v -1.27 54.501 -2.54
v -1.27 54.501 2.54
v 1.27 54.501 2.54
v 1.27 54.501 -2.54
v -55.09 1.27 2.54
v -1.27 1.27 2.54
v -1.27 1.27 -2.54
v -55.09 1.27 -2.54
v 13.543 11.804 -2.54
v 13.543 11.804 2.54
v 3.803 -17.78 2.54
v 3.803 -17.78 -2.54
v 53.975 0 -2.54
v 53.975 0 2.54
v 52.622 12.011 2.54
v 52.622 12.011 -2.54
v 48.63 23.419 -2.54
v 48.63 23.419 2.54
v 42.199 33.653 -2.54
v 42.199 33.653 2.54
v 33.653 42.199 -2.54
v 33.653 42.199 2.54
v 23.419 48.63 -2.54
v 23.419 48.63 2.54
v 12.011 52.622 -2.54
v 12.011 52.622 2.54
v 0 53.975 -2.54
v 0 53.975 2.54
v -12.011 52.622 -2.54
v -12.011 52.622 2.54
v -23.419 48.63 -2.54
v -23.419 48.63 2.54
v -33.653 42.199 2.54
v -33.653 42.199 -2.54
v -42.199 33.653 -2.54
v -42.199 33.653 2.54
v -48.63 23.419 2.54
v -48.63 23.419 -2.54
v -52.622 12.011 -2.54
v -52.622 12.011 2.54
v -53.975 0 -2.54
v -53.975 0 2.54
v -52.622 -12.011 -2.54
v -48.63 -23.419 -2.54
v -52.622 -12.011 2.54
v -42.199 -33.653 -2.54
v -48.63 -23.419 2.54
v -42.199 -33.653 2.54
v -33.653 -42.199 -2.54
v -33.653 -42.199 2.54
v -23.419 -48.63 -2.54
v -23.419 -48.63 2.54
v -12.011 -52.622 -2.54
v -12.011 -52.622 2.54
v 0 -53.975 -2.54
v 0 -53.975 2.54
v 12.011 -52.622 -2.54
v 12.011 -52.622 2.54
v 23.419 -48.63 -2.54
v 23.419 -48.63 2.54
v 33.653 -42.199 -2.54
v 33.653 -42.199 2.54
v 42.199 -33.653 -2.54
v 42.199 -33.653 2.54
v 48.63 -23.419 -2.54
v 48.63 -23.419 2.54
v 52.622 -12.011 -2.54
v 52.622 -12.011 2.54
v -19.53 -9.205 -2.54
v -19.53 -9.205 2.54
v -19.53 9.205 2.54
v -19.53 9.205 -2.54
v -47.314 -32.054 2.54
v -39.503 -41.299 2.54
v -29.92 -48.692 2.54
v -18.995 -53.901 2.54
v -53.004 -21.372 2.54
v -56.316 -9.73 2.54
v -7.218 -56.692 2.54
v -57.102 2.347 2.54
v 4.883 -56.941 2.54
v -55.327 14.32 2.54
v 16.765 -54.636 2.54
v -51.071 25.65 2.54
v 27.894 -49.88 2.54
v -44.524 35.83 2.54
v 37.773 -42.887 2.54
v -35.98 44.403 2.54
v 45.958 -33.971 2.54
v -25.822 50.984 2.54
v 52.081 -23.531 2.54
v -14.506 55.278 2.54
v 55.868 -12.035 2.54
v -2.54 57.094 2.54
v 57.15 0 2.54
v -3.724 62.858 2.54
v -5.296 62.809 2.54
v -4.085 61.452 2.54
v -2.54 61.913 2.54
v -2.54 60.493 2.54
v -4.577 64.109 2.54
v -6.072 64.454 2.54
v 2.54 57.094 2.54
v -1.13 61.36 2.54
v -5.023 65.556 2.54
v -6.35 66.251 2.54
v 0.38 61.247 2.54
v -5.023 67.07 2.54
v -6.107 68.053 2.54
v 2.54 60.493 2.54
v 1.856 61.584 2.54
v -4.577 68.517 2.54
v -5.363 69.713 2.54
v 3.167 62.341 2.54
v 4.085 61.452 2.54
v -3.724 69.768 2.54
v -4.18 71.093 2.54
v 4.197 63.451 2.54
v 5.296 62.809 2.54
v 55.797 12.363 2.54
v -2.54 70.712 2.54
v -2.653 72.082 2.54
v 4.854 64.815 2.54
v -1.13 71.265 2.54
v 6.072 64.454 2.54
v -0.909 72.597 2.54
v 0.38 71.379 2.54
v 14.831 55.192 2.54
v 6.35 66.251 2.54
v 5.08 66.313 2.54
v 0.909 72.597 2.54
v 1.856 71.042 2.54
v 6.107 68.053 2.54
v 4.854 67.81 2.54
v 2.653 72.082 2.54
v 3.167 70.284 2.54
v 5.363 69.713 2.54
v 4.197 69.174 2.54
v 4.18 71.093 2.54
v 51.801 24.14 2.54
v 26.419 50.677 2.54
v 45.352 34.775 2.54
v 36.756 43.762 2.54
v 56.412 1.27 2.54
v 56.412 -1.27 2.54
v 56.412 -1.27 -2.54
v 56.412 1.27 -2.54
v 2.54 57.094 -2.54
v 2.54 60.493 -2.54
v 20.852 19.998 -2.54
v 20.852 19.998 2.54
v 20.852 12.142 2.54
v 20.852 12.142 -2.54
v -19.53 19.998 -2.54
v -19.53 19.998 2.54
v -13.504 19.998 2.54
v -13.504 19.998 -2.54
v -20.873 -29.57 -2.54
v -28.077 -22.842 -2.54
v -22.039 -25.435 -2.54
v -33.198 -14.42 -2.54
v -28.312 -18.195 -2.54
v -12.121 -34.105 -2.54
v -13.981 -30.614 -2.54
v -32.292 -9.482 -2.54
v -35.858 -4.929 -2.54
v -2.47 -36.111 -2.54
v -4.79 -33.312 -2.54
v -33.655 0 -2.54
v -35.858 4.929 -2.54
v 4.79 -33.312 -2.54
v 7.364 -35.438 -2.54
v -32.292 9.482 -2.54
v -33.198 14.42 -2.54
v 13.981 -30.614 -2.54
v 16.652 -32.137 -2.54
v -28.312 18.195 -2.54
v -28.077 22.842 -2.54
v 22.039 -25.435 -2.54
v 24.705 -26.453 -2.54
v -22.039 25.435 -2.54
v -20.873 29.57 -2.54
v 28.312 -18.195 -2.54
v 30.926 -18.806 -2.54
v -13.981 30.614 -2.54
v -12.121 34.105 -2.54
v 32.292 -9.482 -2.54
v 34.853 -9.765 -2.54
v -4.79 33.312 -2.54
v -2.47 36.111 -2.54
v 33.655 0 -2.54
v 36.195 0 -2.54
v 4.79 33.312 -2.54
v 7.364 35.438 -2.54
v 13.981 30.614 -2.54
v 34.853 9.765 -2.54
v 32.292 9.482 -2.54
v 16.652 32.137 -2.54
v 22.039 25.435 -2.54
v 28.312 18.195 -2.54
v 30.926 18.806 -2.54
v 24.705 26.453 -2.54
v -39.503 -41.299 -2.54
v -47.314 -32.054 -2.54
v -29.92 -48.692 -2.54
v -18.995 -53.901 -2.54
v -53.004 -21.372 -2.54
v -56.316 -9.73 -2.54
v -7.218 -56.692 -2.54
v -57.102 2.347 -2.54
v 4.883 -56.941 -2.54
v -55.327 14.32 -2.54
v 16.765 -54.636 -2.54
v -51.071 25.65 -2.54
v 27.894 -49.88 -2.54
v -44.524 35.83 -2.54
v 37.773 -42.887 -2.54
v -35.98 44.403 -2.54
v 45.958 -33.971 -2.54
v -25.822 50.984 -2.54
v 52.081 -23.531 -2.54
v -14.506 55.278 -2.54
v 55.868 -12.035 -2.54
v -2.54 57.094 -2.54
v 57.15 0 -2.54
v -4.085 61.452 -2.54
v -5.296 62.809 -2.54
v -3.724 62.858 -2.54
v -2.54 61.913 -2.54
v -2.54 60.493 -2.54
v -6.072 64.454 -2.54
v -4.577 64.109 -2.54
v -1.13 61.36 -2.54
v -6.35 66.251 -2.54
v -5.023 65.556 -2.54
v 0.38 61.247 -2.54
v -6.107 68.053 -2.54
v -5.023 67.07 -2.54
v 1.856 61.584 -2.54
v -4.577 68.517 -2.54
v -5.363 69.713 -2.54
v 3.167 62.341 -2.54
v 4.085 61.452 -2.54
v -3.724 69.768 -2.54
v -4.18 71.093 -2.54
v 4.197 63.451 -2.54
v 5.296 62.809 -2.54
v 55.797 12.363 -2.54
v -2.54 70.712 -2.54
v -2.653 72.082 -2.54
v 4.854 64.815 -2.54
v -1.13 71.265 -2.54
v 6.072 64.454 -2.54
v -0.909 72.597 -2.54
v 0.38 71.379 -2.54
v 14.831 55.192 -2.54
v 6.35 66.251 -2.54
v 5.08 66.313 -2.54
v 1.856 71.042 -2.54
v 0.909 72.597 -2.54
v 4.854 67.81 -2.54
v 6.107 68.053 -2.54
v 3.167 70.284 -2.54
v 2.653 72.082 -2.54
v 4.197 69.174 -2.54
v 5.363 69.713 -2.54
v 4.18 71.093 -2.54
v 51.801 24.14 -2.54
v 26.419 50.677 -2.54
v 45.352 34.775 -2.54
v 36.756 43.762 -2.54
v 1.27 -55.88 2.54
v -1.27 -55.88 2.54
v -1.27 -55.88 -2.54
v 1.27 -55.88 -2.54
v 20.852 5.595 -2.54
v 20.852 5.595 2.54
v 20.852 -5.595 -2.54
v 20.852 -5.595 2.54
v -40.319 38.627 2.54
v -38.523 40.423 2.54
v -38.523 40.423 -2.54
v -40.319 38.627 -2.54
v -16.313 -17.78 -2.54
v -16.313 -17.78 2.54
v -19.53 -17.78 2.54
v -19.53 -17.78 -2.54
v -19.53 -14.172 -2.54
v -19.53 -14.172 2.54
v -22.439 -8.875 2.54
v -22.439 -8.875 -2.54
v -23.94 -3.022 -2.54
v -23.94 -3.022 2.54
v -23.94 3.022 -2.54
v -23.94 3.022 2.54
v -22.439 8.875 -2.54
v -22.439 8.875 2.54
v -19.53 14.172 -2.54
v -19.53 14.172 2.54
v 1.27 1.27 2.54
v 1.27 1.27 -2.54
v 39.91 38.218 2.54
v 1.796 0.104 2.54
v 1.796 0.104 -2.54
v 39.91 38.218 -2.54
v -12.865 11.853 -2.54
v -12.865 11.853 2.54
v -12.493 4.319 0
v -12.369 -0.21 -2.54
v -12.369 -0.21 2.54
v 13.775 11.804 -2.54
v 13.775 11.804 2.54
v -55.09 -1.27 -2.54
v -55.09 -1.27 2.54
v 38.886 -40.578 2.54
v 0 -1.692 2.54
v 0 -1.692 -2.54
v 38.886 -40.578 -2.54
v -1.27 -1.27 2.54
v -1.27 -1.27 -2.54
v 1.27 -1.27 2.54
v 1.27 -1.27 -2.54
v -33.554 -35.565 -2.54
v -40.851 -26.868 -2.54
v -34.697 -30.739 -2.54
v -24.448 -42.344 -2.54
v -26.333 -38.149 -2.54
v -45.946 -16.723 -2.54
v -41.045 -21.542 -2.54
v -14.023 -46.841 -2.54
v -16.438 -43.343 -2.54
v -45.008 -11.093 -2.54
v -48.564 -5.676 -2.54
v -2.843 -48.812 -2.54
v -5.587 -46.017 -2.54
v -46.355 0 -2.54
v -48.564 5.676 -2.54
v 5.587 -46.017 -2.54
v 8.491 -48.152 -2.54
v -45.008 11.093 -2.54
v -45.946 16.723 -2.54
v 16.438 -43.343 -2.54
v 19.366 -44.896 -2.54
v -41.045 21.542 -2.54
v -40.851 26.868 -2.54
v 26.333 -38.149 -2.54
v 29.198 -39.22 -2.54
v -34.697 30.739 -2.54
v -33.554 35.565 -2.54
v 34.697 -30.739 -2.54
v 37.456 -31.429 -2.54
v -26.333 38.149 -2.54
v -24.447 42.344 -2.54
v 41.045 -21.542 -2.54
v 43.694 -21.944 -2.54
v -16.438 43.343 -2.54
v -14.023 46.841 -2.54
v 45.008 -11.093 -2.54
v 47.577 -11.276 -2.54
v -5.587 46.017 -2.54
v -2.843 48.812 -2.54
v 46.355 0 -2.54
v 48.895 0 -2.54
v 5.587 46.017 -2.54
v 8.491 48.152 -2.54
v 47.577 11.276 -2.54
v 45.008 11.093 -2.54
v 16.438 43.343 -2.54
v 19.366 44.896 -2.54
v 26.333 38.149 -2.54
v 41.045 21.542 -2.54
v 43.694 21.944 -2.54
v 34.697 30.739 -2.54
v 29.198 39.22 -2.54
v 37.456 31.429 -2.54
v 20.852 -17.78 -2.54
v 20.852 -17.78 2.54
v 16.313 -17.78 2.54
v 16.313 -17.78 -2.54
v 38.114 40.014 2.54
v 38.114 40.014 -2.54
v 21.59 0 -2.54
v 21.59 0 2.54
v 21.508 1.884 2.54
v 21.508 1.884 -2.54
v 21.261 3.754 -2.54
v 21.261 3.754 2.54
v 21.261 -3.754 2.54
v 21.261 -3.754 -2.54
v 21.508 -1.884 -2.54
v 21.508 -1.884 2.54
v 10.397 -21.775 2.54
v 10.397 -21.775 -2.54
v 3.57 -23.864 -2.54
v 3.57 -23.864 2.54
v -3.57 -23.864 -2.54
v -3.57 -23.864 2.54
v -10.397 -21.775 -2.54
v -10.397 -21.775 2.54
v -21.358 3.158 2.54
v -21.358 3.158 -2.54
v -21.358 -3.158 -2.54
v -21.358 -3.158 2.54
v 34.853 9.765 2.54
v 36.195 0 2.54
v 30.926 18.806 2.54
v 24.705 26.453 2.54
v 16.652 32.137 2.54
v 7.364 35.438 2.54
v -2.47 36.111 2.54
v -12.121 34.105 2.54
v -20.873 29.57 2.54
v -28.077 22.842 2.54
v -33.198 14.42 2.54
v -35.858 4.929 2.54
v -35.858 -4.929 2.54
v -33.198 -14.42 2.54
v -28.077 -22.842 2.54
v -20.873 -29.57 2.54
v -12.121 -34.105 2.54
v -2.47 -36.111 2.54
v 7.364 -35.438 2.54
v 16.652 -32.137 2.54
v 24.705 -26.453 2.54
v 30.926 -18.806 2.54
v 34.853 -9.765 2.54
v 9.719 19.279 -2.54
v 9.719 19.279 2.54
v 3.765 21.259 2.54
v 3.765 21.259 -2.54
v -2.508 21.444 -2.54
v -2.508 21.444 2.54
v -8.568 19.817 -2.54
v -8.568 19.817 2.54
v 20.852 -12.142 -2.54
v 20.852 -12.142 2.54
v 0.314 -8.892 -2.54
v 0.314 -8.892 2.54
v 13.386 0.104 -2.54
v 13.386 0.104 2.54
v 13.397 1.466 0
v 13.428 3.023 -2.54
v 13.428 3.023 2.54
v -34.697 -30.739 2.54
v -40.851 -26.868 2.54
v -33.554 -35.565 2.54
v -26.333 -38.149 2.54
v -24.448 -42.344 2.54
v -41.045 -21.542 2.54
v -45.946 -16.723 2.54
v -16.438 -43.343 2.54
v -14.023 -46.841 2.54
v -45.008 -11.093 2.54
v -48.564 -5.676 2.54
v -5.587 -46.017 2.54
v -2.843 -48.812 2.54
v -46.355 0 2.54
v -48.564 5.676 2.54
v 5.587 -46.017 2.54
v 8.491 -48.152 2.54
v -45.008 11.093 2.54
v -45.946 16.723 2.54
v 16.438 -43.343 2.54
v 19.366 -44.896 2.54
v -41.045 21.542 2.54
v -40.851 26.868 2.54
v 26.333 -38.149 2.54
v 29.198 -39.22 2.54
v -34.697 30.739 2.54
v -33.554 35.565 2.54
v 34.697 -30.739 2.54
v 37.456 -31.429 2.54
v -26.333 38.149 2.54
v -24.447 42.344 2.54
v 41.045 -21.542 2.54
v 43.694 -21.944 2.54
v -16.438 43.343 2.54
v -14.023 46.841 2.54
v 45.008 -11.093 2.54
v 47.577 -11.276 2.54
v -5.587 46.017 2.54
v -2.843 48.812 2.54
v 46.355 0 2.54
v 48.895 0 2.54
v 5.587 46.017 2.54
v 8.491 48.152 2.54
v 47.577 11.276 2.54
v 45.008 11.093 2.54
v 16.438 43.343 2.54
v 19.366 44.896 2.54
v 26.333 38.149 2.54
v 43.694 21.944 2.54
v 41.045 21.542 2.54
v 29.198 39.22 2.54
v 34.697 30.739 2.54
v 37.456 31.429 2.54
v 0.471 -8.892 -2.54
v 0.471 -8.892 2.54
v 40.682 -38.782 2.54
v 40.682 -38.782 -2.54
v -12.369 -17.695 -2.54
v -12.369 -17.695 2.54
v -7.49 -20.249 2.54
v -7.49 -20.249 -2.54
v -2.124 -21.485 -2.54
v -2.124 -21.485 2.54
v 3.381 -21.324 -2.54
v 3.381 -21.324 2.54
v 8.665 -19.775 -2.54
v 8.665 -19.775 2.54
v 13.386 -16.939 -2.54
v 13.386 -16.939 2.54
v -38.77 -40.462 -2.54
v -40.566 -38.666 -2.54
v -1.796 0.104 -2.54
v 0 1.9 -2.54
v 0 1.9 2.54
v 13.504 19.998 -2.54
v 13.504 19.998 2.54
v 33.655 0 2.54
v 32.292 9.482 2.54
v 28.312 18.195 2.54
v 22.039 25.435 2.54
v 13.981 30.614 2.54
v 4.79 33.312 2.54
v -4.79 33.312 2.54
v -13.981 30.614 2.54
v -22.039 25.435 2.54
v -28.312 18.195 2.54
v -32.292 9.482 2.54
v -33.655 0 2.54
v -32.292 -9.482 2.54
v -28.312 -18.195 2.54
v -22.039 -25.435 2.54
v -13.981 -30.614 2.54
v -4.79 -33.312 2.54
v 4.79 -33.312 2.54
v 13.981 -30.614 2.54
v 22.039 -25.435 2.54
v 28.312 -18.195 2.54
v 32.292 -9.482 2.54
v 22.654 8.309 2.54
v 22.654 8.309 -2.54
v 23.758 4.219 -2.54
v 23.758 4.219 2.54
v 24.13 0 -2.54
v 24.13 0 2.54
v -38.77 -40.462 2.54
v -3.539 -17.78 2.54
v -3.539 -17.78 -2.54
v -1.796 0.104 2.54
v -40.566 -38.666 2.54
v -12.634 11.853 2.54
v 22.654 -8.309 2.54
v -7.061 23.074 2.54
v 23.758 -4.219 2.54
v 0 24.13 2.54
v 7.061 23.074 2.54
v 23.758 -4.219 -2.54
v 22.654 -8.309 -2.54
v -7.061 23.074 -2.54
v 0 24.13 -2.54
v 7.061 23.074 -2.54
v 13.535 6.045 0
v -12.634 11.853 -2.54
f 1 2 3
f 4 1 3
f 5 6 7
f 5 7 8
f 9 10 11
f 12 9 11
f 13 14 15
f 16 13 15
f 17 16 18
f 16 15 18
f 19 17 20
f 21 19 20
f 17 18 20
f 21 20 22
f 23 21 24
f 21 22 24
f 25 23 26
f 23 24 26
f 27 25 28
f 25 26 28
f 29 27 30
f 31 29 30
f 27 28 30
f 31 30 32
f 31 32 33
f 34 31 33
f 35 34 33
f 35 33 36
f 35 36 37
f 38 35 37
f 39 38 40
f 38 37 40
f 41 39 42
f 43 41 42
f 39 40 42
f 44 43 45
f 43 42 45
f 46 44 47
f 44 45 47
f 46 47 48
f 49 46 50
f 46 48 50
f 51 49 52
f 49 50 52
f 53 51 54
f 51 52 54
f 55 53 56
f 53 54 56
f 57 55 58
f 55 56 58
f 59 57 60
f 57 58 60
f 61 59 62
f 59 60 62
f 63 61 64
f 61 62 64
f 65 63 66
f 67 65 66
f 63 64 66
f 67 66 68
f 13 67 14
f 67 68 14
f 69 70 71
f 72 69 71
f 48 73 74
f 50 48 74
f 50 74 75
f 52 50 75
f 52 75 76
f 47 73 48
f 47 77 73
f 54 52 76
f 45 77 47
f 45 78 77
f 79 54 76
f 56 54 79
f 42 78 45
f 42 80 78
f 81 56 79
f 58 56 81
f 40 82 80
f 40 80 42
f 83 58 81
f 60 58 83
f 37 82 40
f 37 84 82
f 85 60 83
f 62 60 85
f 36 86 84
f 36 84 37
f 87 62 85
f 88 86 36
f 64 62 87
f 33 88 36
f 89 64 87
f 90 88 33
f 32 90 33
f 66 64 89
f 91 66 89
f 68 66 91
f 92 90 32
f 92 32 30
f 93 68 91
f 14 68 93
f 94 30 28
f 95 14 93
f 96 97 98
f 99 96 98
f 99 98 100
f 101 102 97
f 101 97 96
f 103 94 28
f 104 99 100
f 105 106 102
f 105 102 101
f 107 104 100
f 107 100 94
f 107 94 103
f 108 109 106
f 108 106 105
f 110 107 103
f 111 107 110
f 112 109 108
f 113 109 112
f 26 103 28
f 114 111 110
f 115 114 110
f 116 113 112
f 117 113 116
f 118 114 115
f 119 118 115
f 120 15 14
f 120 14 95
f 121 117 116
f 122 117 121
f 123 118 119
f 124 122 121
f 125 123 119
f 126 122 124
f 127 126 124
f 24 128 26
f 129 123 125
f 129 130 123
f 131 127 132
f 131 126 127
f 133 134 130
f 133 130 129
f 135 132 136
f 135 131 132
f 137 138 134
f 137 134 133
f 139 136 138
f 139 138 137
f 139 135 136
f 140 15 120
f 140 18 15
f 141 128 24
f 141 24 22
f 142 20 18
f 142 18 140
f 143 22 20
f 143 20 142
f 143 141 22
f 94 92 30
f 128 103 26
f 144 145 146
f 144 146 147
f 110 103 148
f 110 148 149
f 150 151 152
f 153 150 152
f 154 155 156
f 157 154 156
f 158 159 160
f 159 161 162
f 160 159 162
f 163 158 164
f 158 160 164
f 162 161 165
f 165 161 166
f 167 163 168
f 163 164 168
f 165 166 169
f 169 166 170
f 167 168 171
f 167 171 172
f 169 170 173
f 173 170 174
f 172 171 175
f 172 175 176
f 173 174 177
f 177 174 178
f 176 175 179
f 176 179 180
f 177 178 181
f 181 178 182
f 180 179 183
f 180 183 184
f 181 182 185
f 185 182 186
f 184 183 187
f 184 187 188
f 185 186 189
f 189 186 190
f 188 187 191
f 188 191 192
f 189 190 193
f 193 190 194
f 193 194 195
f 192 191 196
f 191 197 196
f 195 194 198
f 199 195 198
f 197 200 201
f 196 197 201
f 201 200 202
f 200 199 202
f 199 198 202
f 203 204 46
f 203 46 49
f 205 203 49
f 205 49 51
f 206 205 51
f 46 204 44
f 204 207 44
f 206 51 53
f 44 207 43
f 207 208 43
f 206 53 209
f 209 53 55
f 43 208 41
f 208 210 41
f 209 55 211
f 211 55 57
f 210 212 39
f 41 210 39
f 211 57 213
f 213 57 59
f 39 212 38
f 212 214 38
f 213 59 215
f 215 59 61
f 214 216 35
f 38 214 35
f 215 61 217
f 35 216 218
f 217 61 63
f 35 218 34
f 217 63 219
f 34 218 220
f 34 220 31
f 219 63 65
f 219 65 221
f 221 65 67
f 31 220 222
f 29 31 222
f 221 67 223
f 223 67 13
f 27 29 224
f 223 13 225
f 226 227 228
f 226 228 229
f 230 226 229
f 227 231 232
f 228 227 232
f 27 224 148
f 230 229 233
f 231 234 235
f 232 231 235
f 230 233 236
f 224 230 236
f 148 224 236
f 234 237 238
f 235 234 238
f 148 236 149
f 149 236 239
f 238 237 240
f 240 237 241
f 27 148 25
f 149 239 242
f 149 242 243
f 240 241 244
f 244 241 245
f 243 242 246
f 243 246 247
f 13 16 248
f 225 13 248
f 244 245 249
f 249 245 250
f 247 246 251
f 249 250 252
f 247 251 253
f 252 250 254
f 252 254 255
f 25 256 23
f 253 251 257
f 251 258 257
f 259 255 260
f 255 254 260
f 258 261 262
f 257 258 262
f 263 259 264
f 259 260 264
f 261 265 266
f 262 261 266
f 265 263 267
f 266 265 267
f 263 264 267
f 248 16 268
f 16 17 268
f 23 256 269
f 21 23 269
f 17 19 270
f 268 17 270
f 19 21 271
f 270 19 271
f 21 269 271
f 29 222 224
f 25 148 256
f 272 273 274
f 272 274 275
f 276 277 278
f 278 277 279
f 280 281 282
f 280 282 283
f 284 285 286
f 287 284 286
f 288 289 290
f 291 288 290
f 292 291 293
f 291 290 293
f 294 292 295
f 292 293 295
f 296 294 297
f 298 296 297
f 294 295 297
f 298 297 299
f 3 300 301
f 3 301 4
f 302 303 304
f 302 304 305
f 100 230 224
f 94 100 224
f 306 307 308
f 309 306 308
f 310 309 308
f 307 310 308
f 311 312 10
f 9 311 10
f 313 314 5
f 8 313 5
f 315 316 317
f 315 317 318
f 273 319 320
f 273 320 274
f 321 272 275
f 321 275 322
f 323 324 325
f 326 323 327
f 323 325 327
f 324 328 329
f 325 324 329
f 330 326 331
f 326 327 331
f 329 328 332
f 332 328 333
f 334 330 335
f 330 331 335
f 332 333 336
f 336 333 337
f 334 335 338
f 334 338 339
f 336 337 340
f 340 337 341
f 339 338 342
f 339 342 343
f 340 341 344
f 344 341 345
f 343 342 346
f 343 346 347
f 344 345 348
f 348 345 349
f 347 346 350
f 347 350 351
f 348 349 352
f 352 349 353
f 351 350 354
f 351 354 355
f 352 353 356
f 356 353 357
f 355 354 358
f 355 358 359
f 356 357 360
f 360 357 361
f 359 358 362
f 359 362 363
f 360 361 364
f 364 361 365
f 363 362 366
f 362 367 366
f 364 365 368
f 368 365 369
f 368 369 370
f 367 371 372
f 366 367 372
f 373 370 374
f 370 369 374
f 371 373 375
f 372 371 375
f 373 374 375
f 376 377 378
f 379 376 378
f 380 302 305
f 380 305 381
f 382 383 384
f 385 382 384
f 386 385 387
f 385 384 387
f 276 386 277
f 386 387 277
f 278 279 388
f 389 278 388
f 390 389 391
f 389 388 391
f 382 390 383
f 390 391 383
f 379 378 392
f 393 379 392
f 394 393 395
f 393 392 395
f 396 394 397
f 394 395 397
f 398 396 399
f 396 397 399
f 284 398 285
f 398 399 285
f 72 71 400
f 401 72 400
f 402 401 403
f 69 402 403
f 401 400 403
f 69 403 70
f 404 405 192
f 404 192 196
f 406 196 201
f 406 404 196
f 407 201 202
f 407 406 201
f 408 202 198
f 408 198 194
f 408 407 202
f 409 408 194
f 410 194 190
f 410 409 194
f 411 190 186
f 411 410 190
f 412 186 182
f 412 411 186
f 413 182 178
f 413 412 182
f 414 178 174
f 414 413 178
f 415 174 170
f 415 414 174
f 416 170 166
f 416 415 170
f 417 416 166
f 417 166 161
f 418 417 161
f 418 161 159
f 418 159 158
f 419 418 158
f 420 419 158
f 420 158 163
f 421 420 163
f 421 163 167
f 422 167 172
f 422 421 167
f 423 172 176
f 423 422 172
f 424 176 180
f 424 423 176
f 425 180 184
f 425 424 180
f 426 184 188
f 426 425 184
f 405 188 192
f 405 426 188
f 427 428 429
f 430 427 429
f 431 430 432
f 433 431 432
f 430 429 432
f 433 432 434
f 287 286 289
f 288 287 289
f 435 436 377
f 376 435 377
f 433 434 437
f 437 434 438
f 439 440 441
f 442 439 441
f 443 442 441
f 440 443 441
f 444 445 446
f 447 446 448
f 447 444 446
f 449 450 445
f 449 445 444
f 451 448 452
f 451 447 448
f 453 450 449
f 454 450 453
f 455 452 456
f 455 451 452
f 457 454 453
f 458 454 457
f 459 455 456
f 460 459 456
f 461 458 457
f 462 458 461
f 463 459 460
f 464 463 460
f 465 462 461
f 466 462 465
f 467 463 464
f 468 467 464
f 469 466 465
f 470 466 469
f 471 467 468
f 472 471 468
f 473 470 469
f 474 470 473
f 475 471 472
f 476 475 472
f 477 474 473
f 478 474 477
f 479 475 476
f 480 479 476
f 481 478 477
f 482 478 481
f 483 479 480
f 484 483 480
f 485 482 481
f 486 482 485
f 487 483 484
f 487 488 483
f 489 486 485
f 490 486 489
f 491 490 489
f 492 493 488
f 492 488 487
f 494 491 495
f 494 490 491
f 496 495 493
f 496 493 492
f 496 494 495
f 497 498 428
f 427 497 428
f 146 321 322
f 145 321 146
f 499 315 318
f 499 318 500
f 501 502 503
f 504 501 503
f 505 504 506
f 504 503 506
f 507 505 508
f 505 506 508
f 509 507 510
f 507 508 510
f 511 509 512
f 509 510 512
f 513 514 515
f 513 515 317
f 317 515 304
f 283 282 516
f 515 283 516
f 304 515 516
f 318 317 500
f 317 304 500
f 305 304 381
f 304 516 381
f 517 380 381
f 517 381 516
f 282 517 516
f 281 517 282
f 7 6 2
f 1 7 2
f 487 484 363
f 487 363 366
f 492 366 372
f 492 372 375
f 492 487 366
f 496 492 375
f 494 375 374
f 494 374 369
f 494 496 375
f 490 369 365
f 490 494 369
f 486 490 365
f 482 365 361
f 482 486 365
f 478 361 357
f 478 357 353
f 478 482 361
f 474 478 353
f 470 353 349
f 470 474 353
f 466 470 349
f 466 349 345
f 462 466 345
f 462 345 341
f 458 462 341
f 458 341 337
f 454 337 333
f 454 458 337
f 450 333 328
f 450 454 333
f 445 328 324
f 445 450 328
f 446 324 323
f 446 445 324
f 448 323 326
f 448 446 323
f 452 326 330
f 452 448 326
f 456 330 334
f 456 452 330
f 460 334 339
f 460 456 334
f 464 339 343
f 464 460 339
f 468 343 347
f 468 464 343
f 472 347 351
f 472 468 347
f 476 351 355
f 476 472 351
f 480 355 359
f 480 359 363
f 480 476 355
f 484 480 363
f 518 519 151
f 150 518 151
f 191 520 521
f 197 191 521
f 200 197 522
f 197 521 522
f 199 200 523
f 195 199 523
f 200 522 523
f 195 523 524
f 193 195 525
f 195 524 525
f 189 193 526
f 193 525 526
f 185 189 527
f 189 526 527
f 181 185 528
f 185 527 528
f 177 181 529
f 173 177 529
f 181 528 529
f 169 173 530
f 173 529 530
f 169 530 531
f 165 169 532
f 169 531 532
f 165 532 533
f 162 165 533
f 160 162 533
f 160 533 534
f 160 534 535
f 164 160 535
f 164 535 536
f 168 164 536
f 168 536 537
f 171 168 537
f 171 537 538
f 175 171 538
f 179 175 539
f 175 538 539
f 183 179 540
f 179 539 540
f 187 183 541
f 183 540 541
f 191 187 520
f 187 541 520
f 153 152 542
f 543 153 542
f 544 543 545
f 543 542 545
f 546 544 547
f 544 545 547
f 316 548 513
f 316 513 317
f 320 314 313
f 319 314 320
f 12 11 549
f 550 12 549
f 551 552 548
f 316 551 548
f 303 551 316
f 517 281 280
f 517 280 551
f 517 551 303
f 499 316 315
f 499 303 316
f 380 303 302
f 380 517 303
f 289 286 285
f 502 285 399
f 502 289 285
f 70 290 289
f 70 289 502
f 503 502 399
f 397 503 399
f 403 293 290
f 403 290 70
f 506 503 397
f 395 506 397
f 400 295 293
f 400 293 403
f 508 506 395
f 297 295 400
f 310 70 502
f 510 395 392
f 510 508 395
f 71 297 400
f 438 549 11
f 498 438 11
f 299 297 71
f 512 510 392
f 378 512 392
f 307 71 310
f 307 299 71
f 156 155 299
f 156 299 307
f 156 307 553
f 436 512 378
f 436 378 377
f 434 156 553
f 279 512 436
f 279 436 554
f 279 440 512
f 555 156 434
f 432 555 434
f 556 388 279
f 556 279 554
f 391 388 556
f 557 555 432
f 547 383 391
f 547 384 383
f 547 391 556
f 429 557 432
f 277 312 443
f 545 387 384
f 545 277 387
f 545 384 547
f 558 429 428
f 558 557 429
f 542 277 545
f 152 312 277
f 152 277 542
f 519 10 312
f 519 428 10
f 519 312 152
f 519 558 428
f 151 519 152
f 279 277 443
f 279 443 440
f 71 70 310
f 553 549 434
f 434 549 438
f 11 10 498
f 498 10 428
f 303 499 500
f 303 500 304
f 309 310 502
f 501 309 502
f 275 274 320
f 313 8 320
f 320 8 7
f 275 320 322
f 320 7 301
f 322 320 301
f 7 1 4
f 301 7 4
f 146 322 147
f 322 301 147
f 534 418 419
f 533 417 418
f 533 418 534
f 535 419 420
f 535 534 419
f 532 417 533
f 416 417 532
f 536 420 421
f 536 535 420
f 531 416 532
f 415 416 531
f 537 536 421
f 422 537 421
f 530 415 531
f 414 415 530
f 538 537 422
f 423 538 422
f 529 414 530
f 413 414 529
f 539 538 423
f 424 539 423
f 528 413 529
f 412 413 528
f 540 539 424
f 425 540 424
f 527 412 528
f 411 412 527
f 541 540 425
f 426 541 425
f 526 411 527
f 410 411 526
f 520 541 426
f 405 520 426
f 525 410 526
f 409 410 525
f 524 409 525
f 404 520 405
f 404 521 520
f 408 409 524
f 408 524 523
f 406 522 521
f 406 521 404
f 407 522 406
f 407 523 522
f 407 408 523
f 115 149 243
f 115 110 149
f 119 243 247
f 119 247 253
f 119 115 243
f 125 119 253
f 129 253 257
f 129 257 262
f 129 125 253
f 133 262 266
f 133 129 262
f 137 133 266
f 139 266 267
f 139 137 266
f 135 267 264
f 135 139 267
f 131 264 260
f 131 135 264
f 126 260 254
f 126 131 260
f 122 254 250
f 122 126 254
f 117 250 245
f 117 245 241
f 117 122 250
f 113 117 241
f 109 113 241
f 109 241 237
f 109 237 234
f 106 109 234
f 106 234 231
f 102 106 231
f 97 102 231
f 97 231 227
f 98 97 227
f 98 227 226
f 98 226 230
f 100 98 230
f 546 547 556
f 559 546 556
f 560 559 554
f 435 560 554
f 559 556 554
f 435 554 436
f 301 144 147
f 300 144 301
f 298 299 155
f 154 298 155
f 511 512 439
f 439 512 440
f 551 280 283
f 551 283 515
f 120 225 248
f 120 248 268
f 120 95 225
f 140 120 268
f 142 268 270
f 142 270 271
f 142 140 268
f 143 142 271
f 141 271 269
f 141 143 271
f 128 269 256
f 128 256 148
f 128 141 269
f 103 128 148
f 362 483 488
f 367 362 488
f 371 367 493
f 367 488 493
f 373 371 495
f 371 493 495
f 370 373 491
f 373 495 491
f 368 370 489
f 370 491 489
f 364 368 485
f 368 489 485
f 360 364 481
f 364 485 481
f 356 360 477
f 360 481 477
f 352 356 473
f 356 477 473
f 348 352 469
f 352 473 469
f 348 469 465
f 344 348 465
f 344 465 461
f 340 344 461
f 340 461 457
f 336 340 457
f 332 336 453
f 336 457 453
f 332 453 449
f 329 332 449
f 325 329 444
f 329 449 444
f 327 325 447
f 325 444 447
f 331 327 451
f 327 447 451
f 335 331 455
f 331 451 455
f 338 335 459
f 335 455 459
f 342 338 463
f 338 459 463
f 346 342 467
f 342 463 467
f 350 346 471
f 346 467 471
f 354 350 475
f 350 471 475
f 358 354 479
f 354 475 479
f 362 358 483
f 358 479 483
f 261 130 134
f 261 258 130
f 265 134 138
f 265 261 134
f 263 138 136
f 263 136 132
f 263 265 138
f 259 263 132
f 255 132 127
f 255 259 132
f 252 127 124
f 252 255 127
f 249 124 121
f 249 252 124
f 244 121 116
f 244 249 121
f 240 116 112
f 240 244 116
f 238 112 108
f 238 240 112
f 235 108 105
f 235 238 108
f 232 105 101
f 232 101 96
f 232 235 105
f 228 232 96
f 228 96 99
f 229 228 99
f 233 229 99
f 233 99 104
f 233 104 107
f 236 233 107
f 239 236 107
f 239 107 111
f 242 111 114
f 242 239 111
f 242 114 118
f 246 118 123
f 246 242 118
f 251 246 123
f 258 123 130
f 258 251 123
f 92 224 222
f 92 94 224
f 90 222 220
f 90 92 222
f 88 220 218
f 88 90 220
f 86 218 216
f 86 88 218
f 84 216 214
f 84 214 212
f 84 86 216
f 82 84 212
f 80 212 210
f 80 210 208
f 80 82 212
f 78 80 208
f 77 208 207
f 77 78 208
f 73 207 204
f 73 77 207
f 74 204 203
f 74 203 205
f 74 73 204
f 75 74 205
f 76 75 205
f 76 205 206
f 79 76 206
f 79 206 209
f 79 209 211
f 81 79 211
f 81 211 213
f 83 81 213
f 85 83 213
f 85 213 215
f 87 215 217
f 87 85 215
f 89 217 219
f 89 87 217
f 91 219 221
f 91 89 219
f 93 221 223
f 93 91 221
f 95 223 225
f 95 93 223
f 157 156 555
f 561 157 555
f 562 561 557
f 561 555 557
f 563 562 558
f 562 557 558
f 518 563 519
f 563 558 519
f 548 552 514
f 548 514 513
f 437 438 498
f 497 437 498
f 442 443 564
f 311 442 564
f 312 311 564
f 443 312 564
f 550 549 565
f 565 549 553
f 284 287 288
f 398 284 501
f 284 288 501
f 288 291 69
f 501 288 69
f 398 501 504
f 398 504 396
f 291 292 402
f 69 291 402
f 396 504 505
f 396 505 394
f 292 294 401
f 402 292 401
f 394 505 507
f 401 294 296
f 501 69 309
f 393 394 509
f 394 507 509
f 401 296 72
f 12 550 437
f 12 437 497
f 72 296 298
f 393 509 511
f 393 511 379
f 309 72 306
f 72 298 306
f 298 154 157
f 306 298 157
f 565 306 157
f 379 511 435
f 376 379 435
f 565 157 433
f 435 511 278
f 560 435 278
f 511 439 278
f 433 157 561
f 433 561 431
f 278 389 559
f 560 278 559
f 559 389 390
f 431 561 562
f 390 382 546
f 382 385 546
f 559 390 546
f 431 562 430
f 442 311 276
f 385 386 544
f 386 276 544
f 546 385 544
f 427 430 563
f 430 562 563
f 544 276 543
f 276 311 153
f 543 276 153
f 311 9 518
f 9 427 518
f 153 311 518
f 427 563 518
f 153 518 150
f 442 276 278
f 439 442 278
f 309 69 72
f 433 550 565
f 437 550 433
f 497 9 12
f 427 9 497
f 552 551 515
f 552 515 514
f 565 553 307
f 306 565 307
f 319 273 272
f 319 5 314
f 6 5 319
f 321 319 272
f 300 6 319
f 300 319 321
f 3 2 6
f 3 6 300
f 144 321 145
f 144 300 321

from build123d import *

# Parameters (mm, degrees)
F0_R     = 57.15
F1_DEPTH = 2.54
F2_R     = 53.975
F2_R_2   = 48.895
F2_R_3   = 46.355
F2_R_4   = 36.195
F2_R_5   = 33.655
F3_DEPTH = 5.08
F4_W     = 2.54
F4_H     = 38.1
F4_H_2   = 2.501237991
F4_W_2   = 18.2595572917
F4_H_3   = 2.54
F4_H_4   = 53.2313856006
F4_W_3   = 35.56
F4_W_4   = 19.5824739583
F5_DEPTH = 5.08
F7_DEPTH = 5.08
F8_R     = 5.08
F9_DEPTH = 2.54


with BuildPart() as f1:
    # F0 (on Top) → F1 (new body, symmetric)
    with BuildSketch(Plane.XY):
        Circle(F0_R)
    extrude(amount=F1_DEPTH, both=True)

    # F2 (on face) → F3 (cut, through all)
    with BuildSketch(Plane.XY.offset(2.54)):
        Circle(F2_R)
        Circle(F2_R_2, mode=Mode.SUBTRACT)
        Circle(F2_R_3)
        Circle(F2_R_4, mode=Mode.SUBTRACT)
        Circle(F2_R_5)
        with BuildLine():
            Line((20.8524739583, 19.9975390625), (20.8524739583, 12.1421262478))
            ThreePointArc((20.8524739583, 12.1421262478), (23.2962131753, 6.2883504747), (24.13, 0))
            ThreePointArc((24.13, 0), (23.2962131753, -6.2883504747), (20.8524739583, -12.1421262478))
            Line((20.8524739583, -12.1421262478), (20.8524739583, -17.78))
            Line((20.8524739583, -17.78), (16.3134453749, -17.78))
            ThreePointArc((16.3134453749, -17.78), (0, -24.13), (-16.3134453749, -17.78))
            Line((-16.3134453749, -17.78), (-19.5295572917, -17.78))
            Line((-19.5295572917, -17.78), (-19.5295572917, -14.1722719418))
            ThreePointArc((-19.5295572917, -14.1722719418), (-24.13, 0), (-19.5295572917, 14.1722719418))
            Line((-19.5295572917, 14.1722719418), (-19.5295572917, 19.9975390625))
            Line((-19.5295572917, 19.9975390625), (-13.5039006011, 19.9975390625))
            ThreePointArc((-13.5039006011, 19.9975390625), (0, 24.13), (13.5039006011, 19.9975390625))
            Line((13.5039006011, 19.9975390625), (20.8524739583, 19.9975390625))
        make_face(mode=Mode.SUBTRACT)
        with BuildLine():
            ThreePointArc((-12.3692708333, -17.6954581475), (0.6336834551, -21.5806984428), (13.3862630208, -16.9391871805))
            Line((13.3862630208, -16.9391871805), (13.3862630208, 0.1041796875))
            add(Edge.make_bspline(
                [(13.3862630208, 0.1041796875), (13.3862630208, 1.36921875), (13.4276041667, 3.0228645833)],
                knots=[0, 0, 0, 1, 1, 1], degree=2))
            add(Edge.make_bspline(
                [(13.4276041667, 3.0228645833), (13.4689453125, 4.6765104167), (13.7748697917, 11.8037239583)],
                knots=[0, 0, 0, 1, 1, 1], degree=2))
            Line((13.7748697917, 11.8037239583), (13.543359375, 11.8037239583))
            Line((13.543359375, 11.8037239583), (3.8033854167, -17.78))
            Line((3.8033854167, -17.78), (-3.5388020833, -17.78))
            Line((-3.5388020833, -17.78), (-12.6338541667, 11.8533333333))
            Line((-12.6338541667, 11.8533333333), (-12.8653645833, 11.8533333333))
            add(Edge.make_bspline(
                [(-12.8653645833, 11.8533333333), (-12.3692708333, 2.8161588542), (-12.3692708333, -0.2100130208)],
                knots=[0, 0, 0, 1, 1, 1], degree=2))
            Line((-12.3692708333, -0.2100130208), (-12.3692708333, -17.6954581475))
        make_face()
        with BuildLine():
            Line((0.4712890625, -8.8916536458), (9.7189801969, 19.2787324254))
            ThreePointArc((9.7189801969, 19.2787324254), (0.6353636743, 21.5806490403), (-8.5679449715, 19.8171243869))
            Line((-8.5679449715, 19.8171243869), (0.3141927083, -8.8916536458))
            Line((0.3141927083, -8.8916536458), (0.4712890625, -8.8916536458))
        make_face()
        with BuildLine():
            Line((-19.5295572917, -9.2045908107), (-19.5295572917, 9.2045908107))
            ThreePointArc((-19.5295572917, 9.2045908107), (-21.59, 0), (-19.5295572917, -9.2045908107))
        make_face()
        with BuildLine():
            ThreePointArc((20.8524739583, -5.5948574439), (21.4048243716, -2.8216296036), (21.59, 0))
            ThreePointArc((21.59, 0), (21.4048243716, 2.8216296036), (20.8524739583, 5.5948574439))
            Line((20.8524739583, 5.5948574439), (20.8524739583, -5.5948574439))
        make_face()
    extrude(amount=-F3_DEPTH, mode=Mode.SUBTRACT)

    # F8 (on Top) → F9 (join, symmetric)
    with BuildSketch(Plane.XY):
        with BuildLine():
            Line((-2.54, 60.4929113338), (-2.54, 55.88))
            Line((-2.54, 55.88), (2.54, 55.88))
            Line((2.54, 55.88), (2.54, 60.4929113338))
            ThreePointArc((2.54, 60.4929113338), (0, 72.6627824664), (-2.54, 60.4929113338))
        make_face()
        with Locations((0, 66.3127824664)):
            Circle(F8_R, mode=Mode.SUBTRACT)
    extrude(amount=F9_DEPTH, both=True)


with BuildPart() as f5:
    # F4 (on face) → F5 (new body, through all)
    with BuildSketch(Plane.XY.offset(2.54)):
        Polygon((-1.27, -3.771237991), (-1.27, -17.78), (1.27, -17.78), (1.27, -6.4586143994), (1.27, -3.771237991), align=None)
        with Locations((0, -36.83)):
            Rectangle(F4_W, F4_H)
        with Locations((0, -2.5206189955)):
            Rectangle(F4_W, F4_H_2)
        with Locations((-10.3997786458, 0)):
            Rectangle(F4_W_2, F4_H_3)
        Rectangle(F4_W, F4_H_3)
        with Locations((0, 27.8856928003)):
            Rectangle(F4_W, F4_H_4)
        with Locations((-37.3095572917, 0)):
            Rectangle(F4_W_3, F4_H_3)
        with Locations((11.0612369792, 0)):
            Rectangle(F4_W_4, F4_H_3)
        with Locations((38.6324739583, 0)):
            Rectangle(F4_W_3, F4_H_3)
    extrude(amount=-F5_DEPTH)


with BuildPart() as f7:
    # F6 (on face) → F7 (new body, through all)
    with BuildSketch(Plane.XY.offset(2.54)):
        Polygon((-38.522596748, 40.4228276597), (-40.3186479722, 38.6267764355), (-1.7960512242, 0.1041796875), (0, 1.9002309117), align=None)
        Polygon((0, 1.9002309117), (-1.7960512242, 0.1041796875), (0, -1.6918715367), (1.7960512242, 0.1041796875), align=None)
        Polygon((0, -1.6918715367), (-1.7960512242, 0.1041796875), (-40.56575401, -38.6655230982), (-38.7697027857, -40.4615743225), align=None)
        Polygon((1.7960512242, 0.1041796875), (0, -1.6918715367), (38.886425444, -40.5782969807), (40.6824766682, -38.7822457565), align=None)
        Polygon((38.1141242547, 40.0143551664), (0, 1.9002309117), (1.7960512242, 0.1041796875), (39.9101754789, 38.2183039422), align=None)
    extrude(amount=-F7_DEPTH)


solid = Compound([f1.part, f5.part, f7.part])
